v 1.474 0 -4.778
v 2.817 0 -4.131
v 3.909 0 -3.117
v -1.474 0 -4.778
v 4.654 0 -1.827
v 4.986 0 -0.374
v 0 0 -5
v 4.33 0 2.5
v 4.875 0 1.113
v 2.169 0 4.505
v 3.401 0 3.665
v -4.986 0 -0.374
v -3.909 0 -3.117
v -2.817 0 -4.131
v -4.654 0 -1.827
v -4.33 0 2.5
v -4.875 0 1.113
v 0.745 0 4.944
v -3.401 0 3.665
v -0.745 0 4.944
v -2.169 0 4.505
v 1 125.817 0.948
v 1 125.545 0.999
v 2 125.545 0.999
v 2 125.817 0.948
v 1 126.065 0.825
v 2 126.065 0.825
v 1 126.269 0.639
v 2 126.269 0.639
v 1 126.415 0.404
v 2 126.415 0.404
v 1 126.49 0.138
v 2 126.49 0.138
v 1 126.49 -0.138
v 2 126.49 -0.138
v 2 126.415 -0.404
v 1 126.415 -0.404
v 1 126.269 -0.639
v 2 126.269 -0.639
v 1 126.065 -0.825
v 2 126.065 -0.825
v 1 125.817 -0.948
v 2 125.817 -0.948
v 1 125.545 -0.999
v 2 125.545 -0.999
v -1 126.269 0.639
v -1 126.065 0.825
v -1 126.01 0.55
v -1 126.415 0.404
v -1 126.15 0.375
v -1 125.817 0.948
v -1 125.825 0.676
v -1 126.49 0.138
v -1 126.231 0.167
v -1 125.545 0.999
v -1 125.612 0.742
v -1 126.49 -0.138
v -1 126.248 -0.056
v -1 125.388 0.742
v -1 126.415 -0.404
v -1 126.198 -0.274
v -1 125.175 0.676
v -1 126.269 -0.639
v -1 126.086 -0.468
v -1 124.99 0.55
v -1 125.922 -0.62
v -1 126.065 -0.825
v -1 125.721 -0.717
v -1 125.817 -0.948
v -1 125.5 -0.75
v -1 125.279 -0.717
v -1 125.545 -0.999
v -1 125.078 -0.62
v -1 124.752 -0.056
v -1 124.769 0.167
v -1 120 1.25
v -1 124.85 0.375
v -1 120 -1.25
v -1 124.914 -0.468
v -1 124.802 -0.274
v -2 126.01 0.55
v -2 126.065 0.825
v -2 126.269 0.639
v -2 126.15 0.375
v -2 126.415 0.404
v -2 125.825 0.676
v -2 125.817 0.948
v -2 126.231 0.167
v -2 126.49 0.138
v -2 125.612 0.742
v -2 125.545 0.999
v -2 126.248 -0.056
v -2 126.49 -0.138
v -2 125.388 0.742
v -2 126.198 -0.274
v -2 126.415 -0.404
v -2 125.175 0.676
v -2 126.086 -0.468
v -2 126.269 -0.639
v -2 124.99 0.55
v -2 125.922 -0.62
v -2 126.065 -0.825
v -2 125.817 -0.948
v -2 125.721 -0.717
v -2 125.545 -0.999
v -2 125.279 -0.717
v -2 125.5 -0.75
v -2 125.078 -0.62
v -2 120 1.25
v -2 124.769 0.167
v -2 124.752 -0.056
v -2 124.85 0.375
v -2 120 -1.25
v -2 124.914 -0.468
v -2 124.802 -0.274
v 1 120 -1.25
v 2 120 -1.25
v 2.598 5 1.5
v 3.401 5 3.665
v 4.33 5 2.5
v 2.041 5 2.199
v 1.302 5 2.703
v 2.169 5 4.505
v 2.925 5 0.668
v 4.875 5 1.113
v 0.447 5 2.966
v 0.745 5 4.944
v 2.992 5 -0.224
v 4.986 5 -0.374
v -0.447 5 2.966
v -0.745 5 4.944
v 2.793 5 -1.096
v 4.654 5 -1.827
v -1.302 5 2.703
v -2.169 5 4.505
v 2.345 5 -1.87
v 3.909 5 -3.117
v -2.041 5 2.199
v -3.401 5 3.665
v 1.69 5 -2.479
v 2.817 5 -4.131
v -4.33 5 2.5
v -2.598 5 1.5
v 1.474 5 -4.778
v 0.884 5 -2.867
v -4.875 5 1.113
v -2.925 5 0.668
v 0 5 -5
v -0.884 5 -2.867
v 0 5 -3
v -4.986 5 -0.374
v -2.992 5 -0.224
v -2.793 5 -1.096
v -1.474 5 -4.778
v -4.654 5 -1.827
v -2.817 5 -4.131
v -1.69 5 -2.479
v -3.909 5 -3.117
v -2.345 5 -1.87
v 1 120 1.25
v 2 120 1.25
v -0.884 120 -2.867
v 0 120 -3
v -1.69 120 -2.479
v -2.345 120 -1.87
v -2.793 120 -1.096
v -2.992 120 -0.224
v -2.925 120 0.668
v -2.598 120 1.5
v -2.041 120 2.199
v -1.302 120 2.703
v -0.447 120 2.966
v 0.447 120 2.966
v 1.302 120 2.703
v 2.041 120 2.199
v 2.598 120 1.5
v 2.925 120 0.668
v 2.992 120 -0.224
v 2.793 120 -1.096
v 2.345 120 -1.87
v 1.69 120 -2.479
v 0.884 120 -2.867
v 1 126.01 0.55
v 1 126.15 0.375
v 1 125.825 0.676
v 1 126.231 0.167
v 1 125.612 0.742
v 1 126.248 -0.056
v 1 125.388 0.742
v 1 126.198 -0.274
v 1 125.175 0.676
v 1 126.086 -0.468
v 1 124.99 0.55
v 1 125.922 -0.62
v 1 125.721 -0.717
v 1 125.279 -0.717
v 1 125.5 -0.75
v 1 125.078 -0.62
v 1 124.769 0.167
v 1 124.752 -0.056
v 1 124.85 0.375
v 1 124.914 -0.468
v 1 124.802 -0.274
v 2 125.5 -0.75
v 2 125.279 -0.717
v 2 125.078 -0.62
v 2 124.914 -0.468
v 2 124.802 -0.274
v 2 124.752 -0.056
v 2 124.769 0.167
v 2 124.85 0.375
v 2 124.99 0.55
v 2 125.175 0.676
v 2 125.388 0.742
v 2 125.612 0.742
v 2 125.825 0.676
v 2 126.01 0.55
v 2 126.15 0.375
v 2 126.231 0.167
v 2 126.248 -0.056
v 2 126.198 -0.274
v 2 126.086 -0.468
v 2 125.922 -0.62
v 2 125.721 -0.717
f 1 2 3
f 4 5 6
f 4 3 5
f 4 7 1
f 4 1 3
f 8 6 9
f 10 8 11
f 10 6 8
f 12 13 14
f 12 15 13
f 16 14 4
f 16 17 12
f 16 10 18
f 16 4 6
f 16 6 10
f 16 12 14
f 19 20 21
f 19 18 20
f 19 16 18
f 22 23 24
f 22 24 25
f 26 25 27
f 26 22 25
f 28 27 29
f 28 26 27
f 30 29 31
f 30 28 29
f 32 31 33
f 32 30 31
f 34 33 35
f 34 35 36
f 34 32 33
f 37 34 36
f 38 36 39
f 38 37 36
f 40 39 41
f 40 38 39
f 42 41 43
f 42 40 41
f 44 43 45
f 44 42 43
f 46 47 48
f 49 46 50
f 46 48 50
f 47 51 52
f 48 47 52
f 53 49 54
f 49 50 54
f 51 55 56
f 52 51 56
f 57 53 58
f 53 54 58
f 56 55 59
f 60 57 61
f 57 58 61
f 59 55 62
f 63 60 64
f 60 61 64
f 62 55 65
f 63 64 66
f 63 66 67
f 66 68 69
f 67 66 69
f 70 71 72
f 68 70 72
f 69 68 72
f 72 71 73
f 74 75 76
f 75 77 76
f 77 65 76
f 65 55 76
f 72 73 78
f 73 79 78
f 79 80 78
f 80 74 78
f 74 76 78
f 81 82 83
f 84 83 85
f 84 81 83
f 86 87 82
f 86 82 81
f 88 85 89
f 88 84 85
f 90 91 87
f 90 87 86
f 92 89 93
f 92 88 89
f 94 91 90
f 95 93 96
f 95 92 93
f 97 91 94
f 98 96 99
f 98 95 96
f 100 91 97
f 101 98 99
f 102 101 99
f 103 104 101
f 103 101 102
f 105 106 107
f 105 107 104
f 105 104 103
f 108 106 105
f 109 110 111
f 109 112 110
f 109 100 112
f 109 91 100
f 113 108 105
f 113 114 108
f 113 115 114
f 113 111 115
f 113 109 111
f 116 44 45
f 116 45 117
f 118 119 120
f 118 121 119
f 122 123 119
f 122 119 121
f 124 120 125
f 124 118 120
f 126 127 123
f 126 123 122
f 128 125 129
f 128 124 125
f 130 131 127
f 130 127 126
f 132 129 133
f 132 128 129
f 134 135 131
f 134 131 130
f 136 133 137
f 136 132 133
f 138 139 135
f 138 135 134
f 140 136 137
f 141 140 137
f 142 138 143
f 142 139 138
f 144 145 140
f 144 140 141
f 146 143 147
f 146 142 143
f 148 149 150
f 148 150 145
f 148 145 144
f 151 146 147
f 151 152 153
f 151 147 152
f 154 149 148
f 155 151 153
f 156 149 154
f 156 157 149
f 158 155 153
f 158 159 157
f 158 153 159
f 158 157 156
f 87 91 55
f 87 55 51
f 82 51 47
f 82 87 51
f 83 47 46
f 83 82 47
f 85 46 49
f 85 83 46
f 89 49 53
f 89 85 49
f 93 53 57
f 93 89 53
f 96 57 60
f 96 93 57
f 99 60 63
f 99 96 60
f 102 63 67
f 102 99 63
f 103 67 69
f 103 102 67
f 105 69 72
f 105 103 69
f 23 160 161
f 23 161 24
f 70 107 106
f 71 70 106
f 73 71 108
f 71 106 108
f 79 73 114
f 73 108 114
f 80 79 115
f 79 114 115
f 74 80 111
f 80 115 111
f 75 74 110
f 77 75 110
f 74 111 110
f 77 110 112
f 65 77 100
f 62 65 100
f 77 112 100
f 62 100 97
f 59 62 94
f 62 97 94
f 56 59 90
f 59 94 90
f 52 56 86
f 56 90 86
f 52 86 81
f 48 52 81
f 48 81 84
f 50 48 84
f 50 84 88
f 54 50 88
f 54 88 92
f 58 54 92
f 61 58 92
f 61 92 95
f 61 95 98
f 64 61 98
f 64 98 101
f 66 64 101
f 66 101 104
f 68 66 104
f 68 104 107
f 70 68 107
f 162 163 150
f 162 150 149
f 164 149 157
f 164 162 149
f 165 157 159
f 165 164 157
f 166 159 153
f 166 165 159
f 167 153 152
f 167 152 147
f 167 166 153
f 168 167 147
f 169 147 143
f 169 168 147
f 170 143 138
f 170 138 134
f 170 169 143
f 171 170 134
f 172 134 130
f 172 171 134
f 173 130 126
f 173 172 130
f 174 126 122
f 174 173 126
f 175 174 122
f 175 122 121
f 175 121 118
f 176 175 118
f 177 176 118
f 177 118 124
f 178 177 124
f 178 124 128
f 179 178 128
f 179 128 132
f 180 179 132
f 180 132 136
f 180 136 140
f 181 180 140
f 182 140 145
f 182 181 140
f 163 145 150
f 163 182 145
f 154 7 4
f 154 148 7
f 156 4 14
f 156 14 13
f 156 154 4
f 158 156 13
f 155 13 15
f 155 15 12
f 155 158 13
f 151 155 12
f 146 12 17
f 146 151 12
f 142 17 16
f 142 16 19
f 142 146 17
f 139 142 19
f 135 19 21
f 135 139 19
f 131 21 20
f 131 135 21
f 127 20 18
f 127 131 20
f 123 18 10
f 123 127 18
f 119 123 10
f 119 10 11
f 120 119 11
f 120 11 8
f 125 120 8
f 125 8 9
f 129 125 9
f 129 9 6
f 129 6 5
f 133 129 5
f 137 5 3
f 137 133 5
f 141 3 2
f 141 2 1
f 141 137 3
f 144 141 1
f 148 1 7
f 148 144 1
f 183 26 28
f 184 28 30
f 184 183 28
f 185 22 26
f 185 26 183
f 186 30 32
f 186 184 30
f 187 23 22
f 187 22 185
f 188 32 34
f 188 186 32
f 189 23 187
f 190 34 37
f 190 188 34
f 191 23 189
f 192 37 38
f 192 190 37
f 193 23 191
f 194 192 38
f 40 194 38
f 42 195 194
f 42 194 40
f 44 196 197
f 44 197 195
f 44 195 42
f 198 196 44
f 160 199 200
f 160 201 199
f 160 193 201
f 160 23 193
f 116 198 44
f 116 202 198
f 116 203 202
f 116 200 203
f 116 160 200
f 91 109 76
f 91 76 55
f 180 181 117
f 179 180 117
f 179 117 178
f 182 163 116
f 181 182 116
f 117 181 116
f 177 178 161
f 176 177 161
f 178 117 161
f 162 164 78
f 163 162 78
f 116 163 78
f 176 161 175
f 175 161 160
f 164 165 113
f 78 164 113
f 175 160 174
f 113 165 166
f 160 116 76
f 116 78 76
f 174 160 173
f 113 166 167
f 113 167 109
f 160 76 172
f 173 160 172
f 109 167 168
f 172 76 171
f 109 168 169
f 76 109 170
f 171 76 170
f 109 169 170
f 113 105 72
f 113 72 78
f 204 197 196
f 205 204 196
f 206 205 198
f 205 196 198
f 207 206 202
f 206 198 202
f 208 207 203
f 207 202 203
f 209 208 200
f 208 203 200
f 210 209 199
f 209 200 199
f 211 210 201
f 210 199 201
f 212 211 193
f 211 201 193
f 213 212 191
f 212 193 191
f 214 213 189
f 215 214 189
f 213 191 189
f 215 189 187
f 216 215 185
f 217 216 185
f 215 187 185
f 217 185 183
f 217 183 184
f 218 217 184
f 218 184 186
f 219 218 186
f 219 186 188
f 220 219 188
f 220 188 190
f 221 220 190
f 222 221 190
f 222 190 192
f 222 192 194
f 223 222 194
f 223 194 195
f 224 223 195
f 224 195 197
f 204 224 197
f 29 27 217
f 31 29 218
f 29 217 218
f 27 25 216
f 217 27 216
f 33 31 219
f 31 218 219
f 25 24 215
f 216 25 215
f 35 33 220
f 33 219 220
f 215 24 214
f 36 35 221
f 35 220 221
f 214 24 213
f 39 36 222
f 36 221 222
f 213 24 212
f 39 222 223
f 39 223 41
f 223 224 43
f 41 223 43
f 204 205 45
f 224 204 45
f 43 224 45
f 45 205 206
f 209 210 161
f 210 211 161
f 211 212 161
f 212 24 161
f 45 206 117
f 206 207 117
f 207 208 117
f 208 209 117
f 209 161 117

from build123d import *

# Parameters (mm, degrees)
SKETCH1_W           = 3
SKETCH1_H           = 10
SKETCH2_W           = 1
SKETCH2_H           = 2.5
BOSS_EXTRUDE2_DEPTH = 7
SKETCH3_R           = 0.75
CUT_EXTRUDE1_DEPTH  = 7


with BuildPart() as part:
    # Sketch1 → Revolve1 (revolve)
    with BuildSketch(Plane.XY, mode=Mode.PRIVATE) as revolve1_sk:
        Polygon((3, 110), (0, 110), (0, 0), (5, 0), (5, 5), (3, 5), align=None)
        with Locations((1.5, 115)):
            Rectangle(SKETCH1_W, SKETCH1_H)
    revolve(revolve1_sk.sketch.rotate(Axis((0, 0, 0), (0, 1, 0)), 90), axis=Axis((0, 0, 0), (0, 1, 0)))

    # Sketch2 → Boss-Extrude2 (add)
    with BuildSketch(Plane(origin=(0, 120, 0), x_dir=(1, 0, 0), z_dir=(0, 1, 0))):
        with Locations((-1.5, 0)):
            Rectangle(SKETCH2_W, SKETCH2_H)
        with Locations((1.5, 0)):
            Rectangle(SKETCH2_W, SKETCH2_H)
    extrude(amount=BOSS_EXTRUDE2_DEPTH)

    # Sketch3 → Cut-Extrude1 (cut)
    with BuildSketch(Plane.ZY.offset(2)):
        with Locations(Location((0, 125.5, 0), (0, 0, 180))):
            Circle(SKETCH3_R)
        with BuildLine():
            Line((1.25, 120), (0.99897696, 125.545222036))
            ThreePointArc((0.99897696, 125.545222036), (0, 126.5), (-0.99897696, 125.545222036))
            Line((-0.99897696, 125.545222036), (-1.25, 120))
            Line((-1.25, 120), (-1.25, 127))
            Line((-1.25, 127), (1.25, 127))
            Line((1.25, 127), (1.25, 120))
        make_face()
    extrude(amount=-CUT_EXTRUDE1_DEPTH, mode=Mode.SUBTRACT)


solid = part.part
